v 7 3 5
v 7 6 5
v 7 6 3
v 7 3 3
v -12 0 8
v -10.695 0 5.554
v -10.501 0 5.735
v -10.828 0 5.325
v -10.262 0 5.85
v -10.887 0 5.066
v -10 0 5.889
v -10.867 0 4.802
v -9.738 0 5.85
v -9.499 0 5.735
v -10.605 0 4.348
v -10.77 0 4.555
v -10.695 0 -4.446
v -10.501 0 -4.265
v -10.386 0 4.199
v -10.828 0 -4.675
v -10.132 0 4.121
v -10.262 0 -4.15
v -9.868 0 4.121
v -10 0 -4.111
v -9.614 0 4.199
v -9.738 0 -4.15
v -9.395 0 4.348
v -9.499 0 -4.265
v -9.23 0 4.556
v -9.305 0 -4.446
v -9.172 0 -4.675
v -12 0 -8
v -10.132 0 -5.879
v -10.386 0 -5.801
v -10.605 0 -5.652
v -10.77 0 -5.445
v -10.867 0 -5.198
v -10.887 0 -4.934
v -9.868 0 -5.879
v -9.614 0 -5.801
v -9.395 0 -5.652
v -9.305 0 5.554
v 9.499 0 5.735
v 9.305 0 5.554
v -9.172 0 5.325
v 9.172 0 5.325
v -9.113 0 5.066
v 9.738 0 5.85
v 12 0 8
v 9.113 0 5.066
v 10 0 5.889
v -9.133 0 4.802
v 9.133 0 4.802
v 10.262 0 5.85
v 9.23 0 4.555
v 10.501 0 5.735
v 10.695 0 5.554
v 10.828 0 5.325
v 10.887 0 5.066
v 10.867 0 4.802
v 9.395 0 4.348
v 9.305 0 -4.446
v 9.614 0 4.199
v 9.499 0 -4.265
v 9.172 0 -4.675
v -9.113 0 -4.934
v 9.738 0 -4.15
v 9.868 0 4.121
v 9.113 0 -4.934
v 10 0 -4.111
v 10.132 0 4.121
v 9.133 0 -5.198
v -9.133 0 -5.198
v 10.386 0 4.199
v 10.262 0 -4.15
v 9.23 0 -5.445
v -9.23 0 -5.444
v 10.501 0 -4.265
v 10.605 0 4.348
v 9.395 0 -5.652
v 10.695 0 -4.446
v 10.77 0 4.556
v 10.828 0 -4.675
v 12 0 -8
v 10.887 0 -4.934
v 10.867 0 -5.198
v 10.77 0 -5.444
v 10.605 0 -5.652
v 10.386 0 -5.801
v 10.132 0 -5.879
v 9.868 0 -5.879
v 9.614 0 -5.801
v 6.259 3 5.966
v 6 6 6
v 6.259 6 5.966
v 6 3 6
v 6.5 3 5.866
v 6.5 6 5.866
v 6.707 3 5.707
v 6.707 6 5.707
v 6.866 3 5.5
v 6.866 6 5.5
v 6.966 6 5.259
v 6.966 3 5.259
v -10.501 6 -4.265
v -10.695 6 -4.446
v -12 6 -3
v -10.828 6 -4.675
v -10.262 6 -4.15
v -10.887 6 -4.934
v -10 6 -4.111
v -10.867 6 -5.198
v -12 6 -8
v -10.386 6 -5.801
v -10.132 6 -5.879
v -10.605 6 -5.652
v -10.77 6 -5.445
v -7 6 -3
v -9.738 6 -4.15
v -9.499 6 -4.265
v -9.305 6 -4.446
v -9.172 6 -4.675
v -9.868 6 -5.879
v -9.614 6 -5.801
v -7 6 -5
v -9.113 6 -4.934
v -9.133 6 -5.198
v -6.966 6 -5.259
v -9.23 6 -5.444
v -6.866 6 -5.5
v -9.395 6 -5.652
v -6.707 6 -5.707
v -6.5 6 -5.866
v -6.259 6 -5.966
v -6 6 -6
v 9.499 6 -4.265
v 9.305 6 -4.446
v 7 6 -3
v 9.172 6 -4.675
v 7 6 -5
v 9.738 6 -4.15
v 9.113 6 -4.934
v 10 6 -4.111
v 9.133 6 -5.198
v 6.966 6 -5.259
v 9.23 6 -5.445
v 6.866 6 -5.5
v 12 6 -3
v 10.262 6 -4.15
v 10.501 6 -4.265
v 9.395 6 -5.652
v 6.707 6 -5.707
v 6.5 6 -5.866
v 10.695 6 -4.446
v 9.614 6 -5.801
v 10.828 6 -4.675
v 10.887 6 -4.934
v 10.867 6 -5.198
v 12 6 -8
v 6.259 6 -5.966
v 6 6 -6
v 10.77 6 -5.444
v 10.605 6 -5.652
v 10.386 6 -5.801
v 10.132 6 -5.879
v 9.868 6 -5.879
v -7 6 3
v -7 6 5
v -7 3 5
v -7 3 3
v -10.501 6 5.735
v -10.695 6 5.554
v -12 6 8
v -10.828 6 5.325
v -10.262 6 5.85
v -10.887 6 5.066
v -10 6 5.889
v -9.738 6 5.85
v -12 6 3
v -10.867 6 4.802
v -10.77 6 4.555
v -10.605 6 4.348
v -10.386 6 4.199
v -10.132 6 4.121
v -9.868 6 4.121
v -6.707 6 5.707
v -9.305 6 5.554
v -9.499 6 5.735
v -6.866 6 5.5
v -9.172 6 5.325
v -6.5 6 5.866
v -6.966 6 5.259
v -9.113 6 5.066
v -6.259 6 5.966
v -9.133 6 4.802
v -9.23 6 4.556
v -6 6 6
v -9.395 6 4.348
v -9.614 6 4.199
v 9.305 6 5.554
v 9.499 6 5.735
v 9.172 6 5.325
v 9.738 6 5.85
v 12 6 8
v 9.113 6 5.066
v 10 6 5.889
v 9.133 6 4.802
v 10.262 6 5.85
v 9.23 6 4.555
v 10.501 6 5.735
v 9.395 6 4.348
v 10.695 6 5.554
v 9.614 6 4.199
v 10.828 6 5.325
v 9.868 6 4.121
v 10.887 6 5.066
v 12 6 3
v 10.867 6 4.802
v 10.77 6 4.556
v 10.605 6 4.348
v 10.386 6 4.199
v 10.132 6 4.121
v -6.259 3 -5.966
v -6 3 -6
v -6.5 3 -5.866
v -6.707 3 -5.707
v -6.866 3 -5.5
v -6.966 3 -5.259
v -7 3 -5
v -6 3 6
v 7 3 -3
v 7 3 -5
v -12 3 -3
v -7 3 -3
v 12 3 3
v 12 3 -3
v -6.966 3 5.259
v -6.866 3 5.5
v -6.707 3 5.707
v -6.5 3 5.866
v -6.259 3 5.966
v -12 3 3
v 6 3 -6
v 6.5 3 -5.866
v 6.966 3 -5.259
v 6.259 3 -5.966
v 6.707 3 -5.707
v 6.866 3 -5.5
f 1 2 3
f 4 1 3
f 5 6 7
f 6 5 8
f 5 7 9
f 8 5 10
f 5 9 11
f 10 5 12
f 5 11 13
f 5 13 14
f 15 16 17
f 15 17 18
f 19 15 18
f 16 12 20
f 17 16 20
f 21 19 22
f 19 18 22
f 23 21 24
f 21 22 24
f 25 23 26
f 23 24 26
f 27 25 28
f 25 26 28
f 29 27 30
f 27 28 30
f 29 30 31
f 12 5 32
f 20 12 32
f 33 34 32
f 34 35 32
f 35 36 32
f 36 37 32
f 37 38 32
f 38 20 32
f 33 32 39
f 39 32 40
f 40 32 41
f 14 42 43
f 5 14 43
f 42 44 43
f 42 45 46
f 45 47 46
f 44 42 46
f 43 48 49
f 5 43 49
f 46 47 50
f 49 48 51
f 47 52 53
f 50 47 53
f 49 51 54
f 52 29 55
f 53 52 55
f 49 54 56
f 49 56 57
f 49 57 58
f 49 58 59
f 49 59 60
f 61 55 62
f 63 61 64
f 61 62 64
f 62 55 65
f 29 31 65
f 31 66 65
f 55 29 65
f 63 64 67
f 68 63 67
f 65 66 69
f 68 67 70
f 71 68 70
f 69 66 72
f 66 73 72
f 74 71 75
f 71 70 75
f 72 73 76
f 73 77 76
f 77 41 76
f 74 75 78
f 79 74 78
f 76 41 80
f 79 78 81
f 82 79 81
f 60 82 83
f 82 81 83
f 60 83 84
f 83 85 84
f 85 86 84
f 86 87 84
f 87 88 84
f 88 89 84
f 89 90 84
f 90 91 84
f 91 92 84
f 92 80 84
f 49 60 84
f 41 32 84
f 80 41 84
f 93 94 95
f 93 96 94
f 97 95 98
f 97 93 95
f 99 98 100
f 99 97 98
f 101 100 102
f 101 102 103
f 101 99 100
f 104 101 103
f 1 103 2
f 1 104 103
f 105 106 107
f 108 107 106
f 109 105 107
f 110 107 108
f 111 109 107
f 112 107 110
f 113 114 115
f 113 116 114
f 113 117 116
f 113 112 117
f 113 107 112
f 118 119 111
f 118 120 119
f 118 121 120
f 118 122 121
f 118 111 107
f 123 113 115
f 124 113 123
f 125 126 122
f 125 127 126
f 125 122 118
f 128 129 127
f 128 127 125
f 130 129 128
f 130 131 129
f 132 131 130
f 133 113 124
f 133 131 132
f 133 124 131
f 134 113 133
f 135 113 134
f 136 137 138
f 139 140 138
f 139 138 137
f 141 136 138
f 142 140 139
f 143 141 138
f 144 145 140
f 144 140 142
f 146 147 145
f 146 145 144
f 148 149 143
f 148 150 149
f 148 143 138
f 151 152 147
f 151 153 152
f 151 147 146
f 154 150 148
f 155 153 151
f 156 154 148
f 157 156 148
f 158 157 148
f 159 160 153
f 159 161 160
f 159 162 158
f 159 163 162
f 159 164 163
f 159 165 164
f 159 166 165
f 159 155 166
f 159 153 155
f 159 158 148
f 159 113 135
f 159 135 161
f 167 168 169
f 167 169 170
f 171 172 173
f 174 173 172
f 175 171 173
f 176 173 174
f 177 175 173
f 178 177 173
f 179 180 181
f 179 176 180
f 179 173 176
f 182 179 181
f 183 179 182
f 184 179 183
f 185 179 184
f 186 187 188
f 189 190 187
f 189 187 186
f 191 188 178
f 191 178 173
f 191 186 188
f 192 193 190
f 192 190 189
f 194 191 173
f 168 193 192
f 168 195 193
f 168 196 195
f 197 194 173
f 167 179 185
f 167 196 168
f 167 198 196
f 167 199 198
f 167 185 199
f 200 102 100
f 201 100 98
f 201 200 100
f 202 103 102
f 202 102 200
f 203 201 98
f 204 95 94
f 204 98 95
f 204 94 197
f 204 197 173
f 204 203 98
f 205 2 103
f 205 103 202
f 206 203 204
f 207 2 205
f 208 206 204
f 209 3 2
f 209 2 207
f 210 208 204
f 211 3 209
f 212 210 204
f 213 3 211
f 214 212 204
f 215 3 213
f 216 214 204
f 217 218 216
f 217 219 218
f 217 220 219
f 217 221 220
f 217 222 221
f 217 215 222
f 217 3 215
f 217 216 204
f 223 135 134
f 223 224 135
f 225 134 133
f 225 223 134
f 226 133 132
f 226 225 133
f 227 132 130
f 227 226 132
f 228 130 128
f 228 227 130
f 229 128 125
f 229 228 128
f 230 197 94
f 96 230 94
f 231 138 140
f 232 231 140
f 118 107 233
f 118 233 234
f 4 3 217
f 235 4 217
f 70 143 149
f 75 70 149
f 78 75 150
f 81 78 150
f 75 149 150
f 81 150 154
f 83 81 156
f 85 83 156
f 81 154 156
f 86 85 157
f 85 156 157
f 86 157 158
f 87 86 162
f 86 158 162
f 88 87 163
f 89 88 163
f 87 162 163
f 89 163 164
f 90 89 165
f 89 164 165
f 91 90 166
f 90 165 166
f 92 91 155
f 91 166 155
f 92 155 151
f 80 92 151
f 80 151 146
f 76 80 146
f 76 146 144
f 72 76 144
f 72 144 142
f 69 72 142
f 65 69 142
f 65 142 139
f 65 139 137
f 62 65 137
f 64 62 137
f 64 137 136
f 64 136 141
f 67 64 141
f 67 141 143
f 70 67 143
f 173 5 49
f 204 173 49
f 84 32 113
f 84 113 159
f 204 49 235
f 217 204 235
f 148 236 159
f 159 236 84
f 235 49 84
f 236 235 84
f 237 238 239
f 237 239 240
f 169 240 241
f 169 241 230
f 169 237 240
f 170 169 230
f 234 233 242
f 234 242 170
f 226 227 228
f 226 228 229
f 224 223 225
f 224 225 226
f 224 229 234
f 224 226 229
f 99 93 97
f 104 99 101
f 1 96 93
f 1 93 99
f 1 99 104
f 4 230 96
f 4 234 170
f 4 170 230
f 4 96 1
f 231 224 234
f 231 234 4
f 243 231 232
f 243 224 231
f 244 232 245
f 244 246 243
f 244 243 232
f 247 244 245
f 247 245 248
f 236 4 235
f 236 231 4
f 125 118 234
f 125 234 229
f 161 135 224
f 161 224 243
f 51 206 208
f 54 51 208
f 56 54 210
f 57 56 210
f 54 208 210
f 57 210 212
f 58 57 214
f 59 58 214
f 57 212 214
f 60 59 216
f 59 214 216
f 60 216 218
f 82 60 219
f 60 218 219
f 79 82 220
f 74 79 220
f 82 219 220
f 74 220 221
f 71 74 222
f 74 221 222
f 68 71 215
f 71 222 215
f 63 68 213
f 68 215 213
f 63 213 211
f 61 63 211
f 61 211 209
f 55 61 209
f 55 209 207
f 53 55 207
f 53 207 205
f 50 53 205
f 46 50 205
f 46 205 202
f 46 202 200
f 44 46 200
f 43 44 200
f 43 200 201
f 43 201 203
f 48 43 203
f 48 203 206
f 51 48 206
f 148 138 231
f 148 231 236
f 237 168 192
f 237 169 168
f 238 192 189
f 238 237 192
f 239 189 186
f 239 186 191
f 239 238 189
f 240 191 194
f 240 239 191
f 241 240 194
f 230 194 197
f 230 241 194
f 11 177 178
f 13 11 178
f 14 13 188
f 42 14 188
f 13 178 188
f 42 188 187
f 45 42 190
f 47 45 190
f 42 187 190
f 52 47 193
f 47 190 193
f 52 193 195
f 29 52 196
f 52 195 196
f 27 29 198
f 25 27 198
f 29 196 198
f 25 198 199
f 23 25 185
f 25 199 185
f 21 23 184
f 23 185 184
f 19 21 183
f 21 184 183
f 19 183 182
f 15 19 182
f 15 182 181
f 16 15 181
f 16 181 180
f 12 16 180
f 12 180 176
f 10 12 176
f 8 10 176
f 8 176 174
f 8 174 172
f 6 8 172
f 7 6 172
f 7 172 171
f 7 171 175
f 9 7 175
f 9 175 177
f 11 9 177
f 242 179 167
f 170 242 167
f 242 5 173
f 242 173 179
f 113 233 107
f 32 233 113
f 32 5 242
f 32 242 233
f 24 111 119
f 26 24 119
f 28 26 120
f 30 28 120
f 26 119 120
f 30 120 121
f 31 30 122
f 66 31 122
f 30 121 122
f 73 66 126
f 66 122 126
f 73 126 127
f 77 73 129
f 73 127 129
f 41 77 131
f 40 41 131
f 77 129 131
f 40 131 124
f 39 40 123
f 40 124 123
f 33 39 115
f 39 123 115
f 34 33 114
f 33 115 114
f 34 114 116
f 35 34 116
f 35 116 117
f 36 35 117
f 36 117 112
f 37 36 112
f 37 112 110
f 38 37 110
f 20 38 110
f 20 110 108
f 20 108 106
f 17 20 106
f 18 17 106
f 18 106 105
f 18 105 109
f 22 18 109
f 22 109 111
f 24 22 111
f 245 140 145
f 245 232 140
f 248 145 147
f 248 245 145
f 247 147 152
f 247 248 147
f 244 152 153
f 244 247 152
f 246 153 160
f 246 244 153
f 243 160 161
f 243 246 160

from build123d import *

# Parameters (mm, degrees)
SKETCH1_W           = 24
SKETCH1_H           = 16
BOSS_EXTRUDE1_DEPTH = 6
SKETCH2_W           = 5
SKETCH2_H           = 6
SKETCH2_W_2         = 14
SKETCH2_H_2         = 12
CUT_EXTRUDE1_DEPTH  = 3
FILLET1_R           = 1
SKETCH3_R           = 0.889
CUT_EXTRUDE2_DEPTH  = 16.620499352


with BuildPart() as part:
    # Sketch1 → Boss-Extrude1 (new body)
    with BuildSketch(Plane(origin=(0, 0, 0), x_dir=(1, 0, 0), z_dir=(0, 1, 0))):
        Rectangle(SKETCH1_W, SKETCH1_H)
    extrude(amount=BOSS_EXTRUDE1_DEPTH)

    # Sketch2 → Cut-Extrude1 (cut)
    with BuildSketch(Plane(origin=(0, 6, 0), x_dir=(1, 0, 0), z_dir=(0, 1, 0))):
        with Locations((-9.5, 0)):
            Rectangle(SKETCH2_W, SKETCH2_H)
        Rectangle(SKETCH2_W_2, SKETCH2_H_2)
        with Locations((9.5, 0)):
            Rectangle(SKETCH2_W, SKETCH2_H)
    extrude(amount=-CUT_EXTRUDE1_DEPTH, mode=Mode.SUBTRACT)

    # Fillet1
    fillet1_edges = [part.edges().sort_by_distance(p)[0] for p in [
        (-7, 4.5, -6),
        (7, 4.5, -6),
        (7, 4.5, 6),
        (-7, 4.5, 6),
    ]]
    fillet(fillet1_edges, radius=FILLET1_R)

    # Sketch3 → Cut-Extrude2 (cut, through all)
    with BuildSketch(Plane(origin=(0, 6, 0), x_dir=(1, 0, 0), z_dir=(0, 1, 0))):
        with Locations(Location((-10, 5, 0), (0, 0, 270))):
            Circle(SKETCH3_R)
        with Locations(Location((-10, -5, 0), (0, 0, 270))):
            Circle(SKETCH3_R)
        with Locations(Location((10, -5, 0), (0, 0, 270))):
            Circle(SKETCH3_R)
        with Locations(Location((10, 5, 0), (0, 0, 270))):
            Circle(SKETCH3_R)
    extrude(amount=-CUT_EXTRUDE2_DEPTH, mode=Mode.SUBTRACT)


solid = part.part
